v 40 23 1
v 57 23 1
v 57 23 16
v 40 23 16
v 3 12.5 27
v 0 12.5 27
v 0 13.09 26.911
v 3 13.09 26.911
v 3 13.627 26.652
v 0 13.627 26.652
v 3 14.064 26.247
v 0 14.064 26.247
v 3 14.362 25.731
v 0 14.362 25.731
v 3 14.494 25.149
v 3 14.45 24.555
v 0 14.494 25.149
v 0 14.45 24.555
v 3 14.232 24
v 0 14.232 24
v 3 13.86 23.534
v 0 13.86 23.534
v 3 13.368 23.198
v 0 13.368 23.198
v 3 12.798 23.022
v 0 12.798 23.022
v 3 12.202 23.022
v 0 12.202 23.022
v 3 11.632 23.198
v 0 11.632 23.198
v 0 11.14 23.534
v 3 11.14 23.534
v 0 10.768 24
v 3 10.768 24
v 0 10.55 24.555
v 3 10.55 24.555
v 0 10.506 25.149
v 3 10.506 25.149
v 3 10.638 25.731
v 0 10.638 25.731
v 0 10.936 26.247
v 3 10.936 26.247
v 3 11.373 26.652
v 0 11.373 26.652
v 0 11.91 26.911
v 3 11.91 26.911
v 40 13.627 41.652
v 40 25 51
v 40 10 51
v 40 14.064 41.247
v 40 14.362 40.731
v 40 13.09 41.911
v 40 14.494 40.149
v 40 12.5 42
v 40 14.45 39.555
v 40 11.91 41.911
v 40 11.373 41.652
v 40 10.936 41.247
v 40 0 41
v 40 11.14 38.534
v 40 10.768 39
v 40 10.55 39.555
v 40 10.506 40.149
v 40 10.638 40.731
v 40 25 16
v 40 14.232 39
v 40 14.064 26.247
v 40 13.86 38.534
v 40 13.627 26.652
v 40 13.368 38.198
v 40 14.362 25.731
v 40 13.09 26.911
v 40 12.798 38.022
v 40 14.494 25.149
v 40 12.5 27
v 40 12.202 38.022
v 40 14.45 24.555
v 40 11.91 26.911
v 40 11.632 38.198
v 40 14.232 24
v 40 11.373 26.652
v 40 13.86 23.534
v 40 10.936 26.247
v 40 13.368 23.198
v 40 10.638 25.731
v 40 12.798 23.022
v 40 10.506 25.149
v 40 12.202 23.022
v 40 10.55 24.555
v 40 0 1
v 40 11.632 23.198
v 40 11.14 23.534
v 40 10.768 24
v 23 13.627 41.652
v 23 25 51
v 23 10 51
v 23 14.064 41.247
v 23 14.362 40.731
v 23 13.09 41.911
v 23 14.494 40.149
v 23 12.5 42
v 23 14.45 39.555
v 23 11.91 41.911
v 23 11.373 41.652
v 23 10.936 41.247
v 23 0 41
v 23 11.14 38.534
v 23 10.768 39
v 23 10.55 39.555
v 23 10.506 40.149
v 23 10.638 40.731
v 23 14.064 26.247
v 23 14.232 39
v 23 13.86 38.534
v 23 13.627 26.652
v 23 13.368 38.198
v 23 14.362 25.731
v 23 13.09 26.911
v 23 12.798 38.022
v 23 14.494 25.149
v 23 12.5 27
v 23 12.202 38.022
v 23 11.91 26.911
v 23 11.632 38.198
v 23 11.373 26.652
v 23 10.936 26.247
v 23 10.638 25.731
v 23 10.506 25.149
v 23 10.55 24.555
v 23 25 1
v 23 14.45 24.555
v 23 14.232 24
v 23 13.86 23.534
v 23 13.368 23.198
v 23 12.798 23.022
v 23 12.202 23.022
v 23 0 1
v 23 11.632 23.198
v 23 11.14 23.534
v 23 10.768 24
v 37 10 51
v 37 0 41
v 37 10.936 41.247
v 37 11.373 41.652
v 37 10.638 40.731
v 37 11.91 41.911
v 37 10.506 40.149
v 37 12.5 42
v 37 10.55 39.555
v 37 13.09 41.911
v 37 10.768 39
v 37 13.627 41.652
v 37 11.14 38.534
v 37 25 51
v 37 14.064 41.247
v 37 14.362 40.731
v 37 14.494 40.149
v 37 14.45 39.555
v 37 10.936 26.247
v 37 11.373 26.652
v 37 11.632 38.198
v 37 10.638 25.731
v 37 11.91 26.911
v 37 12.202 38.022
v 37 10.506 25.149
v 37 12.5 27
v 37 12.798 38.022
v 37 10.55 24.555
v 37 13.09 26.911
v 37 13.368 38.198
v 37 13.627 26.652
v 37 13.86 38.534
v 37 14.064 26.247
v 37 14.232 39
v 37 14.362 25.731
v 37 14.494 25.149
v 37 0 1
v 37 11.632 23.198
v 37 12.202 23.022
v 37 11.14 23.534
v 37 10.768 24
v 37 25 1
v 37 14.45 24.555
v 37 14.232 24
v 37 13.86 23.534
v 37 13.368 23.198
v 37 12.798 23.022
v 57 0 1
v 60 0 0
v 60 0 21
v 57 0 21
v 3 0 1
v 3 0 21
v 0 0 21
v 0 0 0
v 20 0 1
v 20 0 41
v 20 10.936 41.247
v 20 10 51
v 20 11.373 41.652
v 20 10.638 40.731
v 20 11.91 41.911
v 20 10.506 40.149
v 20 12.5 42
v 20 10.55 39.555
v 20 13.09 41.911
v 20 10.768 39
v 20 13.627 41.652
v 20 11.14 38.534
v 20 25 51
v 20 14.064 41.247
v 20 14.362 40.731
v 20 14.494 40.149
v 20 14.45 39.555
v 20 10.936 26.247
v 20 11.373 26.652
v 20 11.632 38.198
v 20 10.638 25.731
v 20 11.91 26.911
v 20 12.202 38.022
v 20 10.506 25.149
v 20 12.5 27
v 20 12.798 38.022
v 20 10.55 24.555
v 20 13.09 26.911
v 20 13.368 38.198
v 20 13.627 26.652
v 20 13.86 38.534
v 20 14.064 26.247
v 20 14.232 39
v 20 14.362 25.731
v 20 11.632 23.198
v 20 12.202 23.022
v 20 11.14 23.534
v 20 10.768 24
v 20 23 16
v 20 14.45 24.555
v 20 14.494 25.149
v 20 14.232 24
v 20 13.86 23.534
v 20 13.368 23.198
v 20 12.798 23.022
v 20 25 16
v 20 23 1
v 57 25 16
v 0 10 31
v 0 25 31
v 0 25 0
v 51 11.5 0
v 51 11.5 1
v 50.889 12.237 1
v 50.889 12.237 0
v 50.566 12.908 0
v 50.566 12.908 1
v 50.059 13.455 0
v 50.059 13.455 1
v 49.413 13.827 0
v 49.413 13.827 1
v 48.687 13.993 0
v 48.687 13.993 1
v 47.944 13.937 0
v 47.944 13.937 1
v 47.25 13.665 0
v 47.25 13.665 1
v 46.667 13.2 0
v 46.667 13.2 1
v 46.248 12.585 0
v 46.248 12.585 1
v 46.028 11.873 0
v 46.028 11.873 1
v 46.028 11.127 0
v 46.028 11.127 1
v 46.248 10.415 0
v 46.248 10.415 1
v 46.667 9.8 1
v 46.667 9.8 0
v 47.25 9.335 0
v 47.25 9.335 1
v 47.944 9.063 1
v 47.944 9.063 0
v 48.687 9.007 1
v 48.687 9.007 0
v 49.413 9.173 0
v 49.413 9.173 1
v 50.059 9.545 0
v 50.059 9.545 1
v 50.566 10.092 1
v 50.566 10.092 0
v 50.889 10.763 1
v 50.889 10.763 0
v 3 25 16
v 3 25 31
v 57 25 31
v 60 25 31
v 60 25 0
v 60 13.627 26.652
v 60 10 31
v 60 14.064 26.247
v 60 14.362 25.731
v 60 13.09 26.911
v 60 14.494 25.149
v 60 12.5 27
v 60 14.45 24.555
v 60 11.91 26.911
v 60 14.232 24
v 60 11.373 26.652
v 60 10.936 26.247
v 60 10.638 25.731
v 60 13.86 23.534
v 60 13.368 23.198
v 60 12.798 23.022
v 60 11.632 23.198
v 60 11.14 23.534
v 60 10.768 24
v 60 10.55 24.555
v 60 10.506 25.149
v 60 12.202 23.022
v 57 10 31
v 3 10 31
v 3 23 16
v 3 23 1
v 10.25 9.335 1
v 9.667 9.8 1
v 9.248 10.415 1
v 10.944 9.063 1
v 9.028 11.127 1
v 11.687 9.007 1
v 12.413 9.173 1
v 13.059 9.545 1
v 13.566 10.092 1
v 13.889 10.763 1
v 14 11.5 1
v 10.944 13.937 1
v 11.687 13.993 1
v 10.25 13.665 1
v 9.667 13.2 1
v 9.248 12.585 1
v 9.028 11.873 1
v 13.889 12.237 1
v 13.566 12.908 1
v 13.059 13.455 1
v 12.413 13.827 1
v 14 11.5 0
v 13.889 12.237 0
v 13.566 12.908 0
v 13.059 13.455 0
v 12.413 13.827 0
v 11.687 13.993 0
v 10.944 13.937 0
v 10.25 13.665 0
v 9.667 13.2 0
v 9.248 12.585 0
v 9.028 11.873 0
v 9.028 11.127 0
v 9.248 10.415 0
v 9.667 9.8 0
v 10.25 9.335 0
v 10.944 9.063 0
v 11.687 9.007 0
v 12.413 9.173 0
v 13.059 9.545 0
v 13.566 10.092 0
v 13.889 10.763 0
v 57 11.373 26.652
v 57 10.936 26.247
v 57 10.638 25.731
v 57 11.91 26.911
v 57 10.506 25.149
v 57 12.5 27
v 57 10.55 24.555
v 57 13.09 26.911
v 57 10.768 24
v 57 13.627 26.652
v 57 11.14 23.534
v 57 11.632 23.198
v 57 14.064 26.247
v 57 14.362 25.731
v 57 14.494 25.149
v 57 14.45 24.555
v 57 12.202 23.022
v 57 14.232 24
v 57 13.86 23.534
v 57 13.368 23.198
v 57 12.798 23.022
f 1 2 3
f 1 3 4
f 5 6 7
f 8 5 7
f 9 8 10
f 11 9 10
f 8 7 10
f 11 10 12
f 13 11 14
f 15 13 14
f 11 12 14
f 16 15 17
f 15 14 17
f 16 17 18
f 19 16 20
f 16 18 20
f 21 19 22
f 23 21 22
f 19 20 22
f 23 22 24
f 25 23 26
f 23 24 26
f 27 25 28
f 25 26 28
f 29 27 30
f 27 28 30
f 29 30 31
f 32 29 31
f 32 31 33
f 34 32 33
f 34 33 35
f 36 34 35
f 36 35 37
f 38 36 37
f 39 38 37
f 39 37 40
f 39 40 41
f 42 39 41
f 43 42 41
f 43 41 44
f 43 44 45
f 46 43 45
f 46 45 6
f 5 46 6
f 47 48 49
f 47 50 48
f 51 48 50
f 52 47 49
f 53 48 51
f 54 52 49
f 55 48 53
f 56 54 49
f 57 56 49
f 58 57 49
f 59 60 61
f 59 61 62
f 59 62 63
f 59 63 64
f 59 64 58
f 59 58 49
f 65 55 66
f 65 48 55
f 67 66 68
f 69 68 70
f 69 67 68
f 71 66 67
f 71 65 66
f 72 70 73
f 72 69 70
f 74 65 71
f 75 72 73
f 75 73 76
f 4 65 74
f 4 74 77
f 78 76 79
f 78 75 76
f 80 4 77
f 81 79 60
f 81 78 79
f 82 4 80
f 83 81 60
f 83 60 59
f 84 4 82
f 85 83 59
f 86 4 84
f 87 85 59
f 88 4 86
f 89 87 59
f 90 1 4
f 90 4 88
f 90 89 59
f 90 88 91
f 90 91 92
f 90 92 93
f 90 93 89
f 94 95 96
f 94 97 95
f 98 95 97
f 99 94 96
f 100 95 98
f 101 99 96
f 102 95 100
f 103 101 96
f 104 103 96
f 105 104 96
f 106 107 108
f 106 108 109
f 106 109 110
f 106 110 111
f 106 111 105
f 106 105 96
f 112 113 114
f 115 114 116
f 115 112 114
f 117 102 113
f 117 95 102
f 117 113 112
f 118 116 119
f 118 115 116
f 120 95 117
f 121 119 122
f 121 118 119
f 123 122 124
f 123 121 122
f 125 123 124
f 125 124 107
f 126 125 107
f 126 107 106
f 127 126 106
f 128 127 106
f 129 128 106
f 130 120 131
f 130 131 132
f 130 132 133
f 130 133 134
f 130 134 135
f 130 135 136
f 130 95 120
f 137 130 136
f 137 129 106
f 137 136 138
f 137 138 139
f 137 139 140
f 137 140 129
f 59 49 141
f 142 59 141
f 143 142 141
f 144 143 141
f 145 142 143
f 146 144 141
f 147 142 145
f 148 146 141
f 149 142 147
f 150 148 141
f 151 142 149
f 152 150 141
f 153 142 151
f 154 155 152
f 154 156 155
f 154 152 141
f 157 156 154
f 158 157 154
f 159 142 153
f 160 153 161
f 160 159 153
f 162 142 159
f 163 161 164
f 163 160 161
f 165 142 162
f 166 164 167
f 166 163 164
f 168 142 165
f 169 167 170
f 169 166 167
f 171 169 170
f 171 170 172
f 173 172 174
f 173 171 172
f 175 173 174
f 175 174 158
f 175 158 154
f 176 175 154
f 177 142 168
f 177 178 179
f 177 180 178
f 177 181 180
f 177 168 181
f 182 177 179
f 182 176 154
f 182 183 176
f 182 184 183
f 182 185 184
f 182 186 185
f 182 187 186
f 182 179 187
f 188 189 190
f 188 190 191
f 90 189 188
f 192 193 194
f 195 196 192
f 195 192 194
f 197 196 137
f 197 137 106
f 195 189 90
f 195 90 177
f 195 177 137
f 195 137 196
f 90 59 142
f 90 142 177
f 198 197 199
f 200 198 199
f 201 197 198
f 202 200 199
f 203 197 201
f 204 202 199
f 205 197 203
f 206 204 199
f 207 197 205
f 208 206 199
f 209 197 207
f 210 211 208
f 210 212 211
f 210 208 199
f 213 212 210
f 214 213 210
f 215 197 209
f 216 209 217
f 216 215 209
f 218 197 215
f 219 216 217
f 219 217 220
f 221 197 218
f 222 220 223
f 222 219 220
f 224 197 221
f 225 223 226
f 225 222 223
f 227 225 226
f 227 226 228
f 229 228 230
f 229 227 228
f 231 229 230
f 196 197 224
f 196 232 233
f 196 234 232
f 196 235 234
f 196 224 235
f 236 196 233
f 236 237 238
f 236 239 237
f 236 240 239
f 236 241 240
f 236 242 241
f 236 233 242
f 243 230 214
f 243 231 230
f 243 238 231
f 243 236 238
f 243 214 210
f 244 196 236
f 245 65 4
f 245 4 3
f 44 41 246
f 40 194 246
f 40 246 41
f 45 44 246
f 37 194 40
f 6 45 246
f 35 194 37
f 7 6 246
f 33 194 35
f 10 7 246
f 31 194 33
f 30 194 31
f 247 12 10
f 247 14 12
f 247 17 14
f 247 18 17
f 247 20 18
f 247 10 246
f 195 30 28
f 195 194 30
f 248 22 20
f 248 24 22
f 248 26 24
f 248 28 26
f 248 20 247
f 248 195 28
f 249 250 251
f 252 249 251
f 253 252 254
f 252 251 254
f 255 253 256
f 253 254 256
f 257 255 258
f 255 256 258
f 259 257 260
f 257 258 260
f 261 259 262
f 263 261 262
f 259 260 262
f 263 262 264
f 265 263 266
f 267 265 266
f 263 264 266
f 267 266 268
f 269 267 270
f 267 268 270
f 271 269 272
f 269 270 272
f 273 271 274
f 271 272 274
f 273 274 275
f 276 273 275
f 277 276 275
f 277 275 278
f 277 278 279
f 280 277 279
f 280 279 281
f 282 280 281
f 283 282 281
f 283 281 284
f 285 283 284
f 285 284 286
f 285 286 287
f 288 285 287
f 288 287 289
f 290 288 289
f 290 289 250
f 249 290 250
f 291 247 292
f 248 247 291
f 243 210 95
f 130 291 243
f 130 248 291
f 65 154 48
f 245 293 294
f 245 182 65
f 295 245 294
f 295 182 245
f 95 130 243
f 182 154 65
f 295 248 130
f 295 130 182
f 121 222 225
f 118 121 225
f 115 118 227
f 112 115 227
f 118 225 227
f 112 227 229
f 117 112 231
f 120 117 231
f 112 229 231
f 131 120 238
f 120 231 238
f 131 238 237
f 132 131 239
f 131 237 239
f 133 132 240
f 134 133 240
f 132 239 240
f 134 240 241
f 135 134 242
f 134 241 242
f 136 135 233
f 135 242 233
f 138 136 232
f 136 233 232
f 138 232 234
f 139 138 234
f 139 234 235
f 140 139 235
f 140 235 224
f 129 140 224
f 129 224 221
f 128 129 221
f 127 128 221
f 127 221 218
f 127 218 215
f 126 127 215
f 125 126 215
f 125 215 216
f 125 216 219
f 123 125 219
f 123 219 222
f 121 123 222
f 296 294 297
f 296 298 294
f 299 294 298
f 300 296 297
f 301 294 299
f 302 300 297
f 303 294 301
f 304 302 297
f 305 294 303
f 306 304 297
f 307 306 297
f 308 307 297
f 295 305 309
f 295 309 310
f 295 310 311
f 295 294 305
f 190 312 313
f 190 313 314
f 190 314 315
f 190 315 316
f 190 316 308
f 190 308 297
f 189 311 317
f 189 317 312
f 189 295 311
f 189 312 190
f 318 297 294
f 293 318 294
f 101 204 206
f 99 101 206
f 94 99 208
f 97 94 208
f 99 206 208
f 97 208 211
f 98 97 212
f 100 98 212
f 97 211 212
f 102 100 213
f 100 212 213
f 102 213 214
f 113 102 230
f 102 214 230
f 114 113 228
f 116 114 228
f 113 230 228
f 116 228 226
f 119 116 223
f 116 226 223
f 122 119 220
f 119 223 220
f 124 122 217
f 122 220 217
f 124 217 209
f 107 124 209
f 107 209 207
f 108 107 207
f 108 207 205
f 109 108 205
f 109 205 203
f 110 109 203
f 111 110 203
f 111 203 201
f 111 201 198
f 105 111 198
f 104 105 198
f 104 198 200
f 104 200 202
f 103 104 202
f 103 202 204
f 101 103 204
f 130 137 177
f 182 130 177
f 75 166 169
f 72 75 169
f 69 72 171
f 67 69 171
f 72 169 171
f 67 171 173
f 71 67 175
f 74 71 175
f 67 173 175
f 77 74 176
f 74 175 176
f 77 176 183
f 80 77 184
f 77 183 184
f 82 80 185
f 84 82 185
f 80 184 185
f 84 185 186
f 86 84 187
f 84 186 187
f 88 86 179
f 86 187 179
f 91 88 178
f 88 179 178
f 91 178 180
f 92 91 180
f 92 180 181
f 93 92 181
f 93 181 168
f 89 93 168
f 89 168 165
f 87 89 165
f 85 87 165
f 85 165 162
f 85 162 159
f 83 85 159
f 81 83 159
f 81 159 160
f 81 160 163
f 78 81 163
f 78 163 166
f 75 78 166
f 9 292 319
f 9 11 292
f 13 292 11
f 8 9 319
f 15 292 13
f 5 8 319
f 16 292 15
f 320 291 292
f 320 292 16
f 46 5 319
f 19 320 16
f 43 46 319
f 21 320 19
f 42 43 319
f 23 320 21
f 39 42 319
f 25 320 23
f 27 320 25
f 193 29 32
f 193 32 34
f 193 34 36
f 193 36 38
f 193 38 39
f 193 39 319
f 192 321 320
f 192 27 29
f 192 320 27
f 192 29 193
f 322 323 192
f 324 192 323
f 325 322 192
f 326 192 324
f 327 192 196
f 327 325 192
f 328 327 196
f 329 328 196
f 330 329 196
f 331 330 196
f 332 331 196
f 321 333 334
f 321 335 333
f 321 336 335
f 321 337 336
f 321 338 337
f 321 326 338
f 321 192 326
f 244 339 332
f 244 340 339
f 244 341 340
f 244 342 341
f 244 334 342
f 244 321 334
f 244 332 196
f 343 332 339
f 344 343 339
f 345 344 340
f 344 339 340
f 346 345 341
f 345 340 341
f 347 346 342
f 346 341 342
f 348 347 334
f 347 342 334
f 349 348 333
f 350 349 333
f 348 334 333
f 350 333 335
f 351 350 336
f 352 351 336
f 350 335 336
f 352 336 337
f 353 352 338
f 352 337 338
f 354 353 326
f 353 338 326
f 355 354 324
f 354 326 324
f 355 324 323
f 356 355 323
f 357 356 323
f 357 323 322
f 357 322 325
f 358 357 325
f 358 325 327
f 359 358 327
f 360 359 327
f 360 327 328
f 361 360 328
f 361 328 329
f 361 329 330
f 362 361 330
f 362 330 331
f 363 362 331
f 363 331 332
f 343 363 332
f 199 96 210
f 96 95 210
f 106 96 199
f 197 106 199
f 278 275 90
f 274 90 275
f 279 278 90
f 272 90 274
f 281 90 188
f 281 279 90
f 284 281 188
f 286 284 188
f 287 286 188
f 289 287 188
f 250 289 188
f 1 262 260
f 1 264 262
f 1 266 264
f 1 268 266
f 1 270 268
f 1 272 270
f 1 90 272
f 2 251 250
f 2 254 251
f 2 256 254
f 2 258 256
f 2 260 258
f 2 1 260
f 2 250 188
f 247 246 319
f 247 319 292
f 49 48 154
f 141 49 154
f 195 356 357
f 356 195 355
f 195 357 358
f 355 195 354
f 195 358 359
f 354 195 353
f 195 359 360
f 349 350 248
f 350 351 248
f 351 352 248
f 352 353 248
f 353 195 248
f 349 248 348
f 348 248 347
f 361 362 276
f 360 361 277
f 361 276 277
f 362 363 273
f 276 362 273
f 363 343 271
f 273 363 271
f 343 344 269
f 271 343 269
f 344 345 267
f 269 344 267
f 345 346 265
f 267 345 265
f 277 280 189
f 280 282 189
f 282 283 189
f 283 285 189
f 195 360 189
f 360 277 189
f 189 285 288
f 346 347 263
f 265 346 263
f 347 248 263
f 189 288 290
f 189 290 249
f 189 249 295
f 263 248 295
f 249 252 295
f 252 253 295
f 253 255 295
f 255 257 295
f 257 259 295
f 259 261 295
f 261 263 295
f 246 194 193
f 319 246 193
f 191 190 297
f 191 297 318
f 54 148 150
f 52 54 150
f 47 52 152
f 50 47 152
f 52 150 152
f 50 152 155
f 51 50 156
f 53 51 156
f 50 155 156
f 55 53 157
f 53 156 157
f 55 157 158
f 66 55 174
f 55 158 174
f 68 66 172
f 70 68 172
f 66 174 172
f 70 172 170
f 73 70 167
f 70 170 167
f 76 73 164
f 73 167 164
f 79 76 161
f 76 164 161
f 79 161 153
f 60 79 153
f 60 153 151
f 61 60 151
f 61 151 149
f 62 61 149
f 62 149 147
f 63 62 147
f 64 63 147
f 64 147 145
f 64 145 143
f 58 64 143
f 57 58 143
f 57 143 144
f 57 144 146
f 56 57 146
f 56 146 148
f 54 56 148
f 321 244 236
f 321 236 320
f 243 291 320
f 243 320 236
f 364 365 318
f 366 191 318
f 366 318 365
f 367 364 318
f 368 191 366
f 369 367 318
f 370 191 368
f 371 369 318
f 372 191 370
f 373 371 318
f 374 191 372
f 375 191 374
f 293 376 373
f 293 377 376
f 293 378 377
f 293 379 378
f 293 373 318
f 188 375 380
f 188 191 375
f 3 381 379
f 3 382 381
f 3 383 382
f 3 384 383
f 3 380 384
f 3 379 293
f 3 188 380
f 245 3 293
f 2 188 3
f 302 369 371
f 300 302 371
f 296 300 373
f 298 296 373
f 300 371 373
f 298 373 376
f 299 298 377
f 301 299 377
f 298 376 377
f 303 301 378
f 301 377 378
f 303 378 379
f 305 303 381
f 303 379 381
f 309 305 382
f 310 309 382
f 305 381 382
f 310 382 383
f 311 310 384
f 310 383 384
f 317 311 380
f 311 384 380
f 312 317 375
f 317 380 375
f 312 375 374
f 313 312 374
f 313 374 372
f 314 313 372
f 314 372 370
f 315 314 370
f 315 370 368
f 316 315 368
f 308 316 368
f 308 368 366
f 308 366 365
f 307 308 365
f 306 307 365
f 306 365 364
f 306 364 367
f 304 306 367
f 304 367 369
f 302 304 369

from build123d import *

# Parameters (mm, degrees)
SZKIC1_W                    = 60
SZKIC1_H                    = 25
DODANIE_WYCI_GNI_CIE1_DEPTH = 1
DODANIE_WYCI_GNI_CIE2_DEPTH = 50
SZKIC4_R                    = 2
WYTNIJ_WYCI_GNI_CIE1_DEPTH  = 61
SZKIC5_W                    = 17
SZKIC5_H                    = 2
WYTNIJ_WYCI_GNI_CIE2_DEPTH  = 35
SZKIC6_W                    = 20
SZKIC6_H                    = 25
WYTNIJ_WYCI_GNI_CIE3_DEPTH  = 3
SZKIC7_W                    = 20
SZKIC7_H                    = 25
WYTNIJ_WYCI_GNI_CIE4_DEPTH  = 3
SFAZOWANIE1_SIZE            = 10
SZKIC8_R                    = 2.5
WYTNIJ_WYCI_GNI_CIE5_DEPTH  = 3
SZKIC9_W                    = 14
SZKIC9_H                    = 2
WYTNIJ_WYCI_GNI_CIE6_DEPTH  = 50


with BuildPart() as part:
    # Szkic1 → Dodanie-wyciągnięcie1 (new body)
    with BuildSketch(Plane.XY):
        with Locations((30, 12.5)):
            Rectangle(SZKIC1_W, SZKIC1_H)
    extrude(amount=DODANIE_WYCI_GNI_CIE1_DEPTH)

    # Szkic3 → Dodanie-wyciągnięcie2 (add)
    with BuildSketch(Plane.XY.offset(1)):
        Polygon((0, 0), (0, 25), (60, 25), (60, 0), (57, 0), (57, 23), (40, 23), (40, 0), (37, 0), (37, 23), (23, 23), (23, 0), (20, 0), (20, 23), (3, 23), (3, 0), align=None)
    extrude(amount=DODANIE_WYCI_GNI_CIE2_DEPTH)

    # Szkic4 → Wytnij-wyciągnięcie1 (cut, through all)
    with BuildSketch(Plane.ZY):
        with Locations((25, 12.5)):
            Circle(SZKIC4_R)
        with Locations((40, 12.5)):
            Circle(SZKIC4_R)
    extrude(amount=-WYTNIJ_WYCI_GNI_CIE1_DEPTH, mode=Mode.SUBTRACT)

    # Szkic5 → Wytnij-wyciągnięcie2 (cut)
    with BuildSketch(Plane.XY.offset(51)):
        with Locations((48.5, 24)):
            Rectangle(SZKIC5_W, SZKIC5_H)
        with Locations((11.5, 24)):
            Rectangle(SZKIC5_W, SZKIC5_H)
    extrude(amount=-WYTNIJ_WYCI_GNI_CIE2_DEPTH, mode=Mode.SUBTRACT)

    # Szkic6 → Wytnij-wyciągnięcie3 (cut)
    with BuildSketch(Plane.ZY):
        with Locations((41, 12.5)):
            Rectangle(SZKIC6_W, SZKIC6_H)
    extrude(amount=-WYTNIJ_WYCI_GNI_CIE3_DEPTH, mode=Mode.SUBTRACT)

    # Szkic7 → Wytnij-wyciągnięcie4 (cut)
    with BuildSketch(Plane(origin=(60, 0, 0), x_dir=(0, 0, -1), z_dir=(1, 0, 0))):
        with Locations((-41, 12.5)):
            Rectangle(SZKIC7_W, SZKIC7_H)
    extrude(amount=-WYTNIJ_WYCI_GNI_CIE4_DEPTH, mode=Mode.SUBTRACT)

    # Sfazowanie1
    sfazowanie1_edges = [part.edges().sort_by_distance(p)[0] for p in [
        (1.5, 0, 31),
        (58.5, 0, 31),
        (21.5, 0, 51),
        (38.5, 0, 51),
    ]]
    chamfer(sfazowanie1_edges, length=SFAZOWANIE1_SIZE)

    # Szkic8 → Wytnij-wyciągnięcie5 (cut)
    with BuildSketch(Plane.XY.offset(1)):
        with Locations((11.5, 11.5)):
            Circle(SZKIC8_R)
        with Locations((48.5, 11.5)):
            Circle(SZKIC8_R)
    extrude(amount=-WYTNIJ_WYCI_GNI_CIE5_DEPTH, mode=Mode.SUBTRACT)

    # Szkic9 → Wytnij-wyciągnięcie6 (cut)
    with BuildSketch(Plane.XY.offset(51)):
        with Locations((30, 24)):
            Rectangle(SZKIC9_W, SZKIC9_H)
    extrude(amount=-WYTNIJ_WYCI_GNI_CIE6_DEPTH, mode=Mode.SUBTRACT)


solid = part.part
